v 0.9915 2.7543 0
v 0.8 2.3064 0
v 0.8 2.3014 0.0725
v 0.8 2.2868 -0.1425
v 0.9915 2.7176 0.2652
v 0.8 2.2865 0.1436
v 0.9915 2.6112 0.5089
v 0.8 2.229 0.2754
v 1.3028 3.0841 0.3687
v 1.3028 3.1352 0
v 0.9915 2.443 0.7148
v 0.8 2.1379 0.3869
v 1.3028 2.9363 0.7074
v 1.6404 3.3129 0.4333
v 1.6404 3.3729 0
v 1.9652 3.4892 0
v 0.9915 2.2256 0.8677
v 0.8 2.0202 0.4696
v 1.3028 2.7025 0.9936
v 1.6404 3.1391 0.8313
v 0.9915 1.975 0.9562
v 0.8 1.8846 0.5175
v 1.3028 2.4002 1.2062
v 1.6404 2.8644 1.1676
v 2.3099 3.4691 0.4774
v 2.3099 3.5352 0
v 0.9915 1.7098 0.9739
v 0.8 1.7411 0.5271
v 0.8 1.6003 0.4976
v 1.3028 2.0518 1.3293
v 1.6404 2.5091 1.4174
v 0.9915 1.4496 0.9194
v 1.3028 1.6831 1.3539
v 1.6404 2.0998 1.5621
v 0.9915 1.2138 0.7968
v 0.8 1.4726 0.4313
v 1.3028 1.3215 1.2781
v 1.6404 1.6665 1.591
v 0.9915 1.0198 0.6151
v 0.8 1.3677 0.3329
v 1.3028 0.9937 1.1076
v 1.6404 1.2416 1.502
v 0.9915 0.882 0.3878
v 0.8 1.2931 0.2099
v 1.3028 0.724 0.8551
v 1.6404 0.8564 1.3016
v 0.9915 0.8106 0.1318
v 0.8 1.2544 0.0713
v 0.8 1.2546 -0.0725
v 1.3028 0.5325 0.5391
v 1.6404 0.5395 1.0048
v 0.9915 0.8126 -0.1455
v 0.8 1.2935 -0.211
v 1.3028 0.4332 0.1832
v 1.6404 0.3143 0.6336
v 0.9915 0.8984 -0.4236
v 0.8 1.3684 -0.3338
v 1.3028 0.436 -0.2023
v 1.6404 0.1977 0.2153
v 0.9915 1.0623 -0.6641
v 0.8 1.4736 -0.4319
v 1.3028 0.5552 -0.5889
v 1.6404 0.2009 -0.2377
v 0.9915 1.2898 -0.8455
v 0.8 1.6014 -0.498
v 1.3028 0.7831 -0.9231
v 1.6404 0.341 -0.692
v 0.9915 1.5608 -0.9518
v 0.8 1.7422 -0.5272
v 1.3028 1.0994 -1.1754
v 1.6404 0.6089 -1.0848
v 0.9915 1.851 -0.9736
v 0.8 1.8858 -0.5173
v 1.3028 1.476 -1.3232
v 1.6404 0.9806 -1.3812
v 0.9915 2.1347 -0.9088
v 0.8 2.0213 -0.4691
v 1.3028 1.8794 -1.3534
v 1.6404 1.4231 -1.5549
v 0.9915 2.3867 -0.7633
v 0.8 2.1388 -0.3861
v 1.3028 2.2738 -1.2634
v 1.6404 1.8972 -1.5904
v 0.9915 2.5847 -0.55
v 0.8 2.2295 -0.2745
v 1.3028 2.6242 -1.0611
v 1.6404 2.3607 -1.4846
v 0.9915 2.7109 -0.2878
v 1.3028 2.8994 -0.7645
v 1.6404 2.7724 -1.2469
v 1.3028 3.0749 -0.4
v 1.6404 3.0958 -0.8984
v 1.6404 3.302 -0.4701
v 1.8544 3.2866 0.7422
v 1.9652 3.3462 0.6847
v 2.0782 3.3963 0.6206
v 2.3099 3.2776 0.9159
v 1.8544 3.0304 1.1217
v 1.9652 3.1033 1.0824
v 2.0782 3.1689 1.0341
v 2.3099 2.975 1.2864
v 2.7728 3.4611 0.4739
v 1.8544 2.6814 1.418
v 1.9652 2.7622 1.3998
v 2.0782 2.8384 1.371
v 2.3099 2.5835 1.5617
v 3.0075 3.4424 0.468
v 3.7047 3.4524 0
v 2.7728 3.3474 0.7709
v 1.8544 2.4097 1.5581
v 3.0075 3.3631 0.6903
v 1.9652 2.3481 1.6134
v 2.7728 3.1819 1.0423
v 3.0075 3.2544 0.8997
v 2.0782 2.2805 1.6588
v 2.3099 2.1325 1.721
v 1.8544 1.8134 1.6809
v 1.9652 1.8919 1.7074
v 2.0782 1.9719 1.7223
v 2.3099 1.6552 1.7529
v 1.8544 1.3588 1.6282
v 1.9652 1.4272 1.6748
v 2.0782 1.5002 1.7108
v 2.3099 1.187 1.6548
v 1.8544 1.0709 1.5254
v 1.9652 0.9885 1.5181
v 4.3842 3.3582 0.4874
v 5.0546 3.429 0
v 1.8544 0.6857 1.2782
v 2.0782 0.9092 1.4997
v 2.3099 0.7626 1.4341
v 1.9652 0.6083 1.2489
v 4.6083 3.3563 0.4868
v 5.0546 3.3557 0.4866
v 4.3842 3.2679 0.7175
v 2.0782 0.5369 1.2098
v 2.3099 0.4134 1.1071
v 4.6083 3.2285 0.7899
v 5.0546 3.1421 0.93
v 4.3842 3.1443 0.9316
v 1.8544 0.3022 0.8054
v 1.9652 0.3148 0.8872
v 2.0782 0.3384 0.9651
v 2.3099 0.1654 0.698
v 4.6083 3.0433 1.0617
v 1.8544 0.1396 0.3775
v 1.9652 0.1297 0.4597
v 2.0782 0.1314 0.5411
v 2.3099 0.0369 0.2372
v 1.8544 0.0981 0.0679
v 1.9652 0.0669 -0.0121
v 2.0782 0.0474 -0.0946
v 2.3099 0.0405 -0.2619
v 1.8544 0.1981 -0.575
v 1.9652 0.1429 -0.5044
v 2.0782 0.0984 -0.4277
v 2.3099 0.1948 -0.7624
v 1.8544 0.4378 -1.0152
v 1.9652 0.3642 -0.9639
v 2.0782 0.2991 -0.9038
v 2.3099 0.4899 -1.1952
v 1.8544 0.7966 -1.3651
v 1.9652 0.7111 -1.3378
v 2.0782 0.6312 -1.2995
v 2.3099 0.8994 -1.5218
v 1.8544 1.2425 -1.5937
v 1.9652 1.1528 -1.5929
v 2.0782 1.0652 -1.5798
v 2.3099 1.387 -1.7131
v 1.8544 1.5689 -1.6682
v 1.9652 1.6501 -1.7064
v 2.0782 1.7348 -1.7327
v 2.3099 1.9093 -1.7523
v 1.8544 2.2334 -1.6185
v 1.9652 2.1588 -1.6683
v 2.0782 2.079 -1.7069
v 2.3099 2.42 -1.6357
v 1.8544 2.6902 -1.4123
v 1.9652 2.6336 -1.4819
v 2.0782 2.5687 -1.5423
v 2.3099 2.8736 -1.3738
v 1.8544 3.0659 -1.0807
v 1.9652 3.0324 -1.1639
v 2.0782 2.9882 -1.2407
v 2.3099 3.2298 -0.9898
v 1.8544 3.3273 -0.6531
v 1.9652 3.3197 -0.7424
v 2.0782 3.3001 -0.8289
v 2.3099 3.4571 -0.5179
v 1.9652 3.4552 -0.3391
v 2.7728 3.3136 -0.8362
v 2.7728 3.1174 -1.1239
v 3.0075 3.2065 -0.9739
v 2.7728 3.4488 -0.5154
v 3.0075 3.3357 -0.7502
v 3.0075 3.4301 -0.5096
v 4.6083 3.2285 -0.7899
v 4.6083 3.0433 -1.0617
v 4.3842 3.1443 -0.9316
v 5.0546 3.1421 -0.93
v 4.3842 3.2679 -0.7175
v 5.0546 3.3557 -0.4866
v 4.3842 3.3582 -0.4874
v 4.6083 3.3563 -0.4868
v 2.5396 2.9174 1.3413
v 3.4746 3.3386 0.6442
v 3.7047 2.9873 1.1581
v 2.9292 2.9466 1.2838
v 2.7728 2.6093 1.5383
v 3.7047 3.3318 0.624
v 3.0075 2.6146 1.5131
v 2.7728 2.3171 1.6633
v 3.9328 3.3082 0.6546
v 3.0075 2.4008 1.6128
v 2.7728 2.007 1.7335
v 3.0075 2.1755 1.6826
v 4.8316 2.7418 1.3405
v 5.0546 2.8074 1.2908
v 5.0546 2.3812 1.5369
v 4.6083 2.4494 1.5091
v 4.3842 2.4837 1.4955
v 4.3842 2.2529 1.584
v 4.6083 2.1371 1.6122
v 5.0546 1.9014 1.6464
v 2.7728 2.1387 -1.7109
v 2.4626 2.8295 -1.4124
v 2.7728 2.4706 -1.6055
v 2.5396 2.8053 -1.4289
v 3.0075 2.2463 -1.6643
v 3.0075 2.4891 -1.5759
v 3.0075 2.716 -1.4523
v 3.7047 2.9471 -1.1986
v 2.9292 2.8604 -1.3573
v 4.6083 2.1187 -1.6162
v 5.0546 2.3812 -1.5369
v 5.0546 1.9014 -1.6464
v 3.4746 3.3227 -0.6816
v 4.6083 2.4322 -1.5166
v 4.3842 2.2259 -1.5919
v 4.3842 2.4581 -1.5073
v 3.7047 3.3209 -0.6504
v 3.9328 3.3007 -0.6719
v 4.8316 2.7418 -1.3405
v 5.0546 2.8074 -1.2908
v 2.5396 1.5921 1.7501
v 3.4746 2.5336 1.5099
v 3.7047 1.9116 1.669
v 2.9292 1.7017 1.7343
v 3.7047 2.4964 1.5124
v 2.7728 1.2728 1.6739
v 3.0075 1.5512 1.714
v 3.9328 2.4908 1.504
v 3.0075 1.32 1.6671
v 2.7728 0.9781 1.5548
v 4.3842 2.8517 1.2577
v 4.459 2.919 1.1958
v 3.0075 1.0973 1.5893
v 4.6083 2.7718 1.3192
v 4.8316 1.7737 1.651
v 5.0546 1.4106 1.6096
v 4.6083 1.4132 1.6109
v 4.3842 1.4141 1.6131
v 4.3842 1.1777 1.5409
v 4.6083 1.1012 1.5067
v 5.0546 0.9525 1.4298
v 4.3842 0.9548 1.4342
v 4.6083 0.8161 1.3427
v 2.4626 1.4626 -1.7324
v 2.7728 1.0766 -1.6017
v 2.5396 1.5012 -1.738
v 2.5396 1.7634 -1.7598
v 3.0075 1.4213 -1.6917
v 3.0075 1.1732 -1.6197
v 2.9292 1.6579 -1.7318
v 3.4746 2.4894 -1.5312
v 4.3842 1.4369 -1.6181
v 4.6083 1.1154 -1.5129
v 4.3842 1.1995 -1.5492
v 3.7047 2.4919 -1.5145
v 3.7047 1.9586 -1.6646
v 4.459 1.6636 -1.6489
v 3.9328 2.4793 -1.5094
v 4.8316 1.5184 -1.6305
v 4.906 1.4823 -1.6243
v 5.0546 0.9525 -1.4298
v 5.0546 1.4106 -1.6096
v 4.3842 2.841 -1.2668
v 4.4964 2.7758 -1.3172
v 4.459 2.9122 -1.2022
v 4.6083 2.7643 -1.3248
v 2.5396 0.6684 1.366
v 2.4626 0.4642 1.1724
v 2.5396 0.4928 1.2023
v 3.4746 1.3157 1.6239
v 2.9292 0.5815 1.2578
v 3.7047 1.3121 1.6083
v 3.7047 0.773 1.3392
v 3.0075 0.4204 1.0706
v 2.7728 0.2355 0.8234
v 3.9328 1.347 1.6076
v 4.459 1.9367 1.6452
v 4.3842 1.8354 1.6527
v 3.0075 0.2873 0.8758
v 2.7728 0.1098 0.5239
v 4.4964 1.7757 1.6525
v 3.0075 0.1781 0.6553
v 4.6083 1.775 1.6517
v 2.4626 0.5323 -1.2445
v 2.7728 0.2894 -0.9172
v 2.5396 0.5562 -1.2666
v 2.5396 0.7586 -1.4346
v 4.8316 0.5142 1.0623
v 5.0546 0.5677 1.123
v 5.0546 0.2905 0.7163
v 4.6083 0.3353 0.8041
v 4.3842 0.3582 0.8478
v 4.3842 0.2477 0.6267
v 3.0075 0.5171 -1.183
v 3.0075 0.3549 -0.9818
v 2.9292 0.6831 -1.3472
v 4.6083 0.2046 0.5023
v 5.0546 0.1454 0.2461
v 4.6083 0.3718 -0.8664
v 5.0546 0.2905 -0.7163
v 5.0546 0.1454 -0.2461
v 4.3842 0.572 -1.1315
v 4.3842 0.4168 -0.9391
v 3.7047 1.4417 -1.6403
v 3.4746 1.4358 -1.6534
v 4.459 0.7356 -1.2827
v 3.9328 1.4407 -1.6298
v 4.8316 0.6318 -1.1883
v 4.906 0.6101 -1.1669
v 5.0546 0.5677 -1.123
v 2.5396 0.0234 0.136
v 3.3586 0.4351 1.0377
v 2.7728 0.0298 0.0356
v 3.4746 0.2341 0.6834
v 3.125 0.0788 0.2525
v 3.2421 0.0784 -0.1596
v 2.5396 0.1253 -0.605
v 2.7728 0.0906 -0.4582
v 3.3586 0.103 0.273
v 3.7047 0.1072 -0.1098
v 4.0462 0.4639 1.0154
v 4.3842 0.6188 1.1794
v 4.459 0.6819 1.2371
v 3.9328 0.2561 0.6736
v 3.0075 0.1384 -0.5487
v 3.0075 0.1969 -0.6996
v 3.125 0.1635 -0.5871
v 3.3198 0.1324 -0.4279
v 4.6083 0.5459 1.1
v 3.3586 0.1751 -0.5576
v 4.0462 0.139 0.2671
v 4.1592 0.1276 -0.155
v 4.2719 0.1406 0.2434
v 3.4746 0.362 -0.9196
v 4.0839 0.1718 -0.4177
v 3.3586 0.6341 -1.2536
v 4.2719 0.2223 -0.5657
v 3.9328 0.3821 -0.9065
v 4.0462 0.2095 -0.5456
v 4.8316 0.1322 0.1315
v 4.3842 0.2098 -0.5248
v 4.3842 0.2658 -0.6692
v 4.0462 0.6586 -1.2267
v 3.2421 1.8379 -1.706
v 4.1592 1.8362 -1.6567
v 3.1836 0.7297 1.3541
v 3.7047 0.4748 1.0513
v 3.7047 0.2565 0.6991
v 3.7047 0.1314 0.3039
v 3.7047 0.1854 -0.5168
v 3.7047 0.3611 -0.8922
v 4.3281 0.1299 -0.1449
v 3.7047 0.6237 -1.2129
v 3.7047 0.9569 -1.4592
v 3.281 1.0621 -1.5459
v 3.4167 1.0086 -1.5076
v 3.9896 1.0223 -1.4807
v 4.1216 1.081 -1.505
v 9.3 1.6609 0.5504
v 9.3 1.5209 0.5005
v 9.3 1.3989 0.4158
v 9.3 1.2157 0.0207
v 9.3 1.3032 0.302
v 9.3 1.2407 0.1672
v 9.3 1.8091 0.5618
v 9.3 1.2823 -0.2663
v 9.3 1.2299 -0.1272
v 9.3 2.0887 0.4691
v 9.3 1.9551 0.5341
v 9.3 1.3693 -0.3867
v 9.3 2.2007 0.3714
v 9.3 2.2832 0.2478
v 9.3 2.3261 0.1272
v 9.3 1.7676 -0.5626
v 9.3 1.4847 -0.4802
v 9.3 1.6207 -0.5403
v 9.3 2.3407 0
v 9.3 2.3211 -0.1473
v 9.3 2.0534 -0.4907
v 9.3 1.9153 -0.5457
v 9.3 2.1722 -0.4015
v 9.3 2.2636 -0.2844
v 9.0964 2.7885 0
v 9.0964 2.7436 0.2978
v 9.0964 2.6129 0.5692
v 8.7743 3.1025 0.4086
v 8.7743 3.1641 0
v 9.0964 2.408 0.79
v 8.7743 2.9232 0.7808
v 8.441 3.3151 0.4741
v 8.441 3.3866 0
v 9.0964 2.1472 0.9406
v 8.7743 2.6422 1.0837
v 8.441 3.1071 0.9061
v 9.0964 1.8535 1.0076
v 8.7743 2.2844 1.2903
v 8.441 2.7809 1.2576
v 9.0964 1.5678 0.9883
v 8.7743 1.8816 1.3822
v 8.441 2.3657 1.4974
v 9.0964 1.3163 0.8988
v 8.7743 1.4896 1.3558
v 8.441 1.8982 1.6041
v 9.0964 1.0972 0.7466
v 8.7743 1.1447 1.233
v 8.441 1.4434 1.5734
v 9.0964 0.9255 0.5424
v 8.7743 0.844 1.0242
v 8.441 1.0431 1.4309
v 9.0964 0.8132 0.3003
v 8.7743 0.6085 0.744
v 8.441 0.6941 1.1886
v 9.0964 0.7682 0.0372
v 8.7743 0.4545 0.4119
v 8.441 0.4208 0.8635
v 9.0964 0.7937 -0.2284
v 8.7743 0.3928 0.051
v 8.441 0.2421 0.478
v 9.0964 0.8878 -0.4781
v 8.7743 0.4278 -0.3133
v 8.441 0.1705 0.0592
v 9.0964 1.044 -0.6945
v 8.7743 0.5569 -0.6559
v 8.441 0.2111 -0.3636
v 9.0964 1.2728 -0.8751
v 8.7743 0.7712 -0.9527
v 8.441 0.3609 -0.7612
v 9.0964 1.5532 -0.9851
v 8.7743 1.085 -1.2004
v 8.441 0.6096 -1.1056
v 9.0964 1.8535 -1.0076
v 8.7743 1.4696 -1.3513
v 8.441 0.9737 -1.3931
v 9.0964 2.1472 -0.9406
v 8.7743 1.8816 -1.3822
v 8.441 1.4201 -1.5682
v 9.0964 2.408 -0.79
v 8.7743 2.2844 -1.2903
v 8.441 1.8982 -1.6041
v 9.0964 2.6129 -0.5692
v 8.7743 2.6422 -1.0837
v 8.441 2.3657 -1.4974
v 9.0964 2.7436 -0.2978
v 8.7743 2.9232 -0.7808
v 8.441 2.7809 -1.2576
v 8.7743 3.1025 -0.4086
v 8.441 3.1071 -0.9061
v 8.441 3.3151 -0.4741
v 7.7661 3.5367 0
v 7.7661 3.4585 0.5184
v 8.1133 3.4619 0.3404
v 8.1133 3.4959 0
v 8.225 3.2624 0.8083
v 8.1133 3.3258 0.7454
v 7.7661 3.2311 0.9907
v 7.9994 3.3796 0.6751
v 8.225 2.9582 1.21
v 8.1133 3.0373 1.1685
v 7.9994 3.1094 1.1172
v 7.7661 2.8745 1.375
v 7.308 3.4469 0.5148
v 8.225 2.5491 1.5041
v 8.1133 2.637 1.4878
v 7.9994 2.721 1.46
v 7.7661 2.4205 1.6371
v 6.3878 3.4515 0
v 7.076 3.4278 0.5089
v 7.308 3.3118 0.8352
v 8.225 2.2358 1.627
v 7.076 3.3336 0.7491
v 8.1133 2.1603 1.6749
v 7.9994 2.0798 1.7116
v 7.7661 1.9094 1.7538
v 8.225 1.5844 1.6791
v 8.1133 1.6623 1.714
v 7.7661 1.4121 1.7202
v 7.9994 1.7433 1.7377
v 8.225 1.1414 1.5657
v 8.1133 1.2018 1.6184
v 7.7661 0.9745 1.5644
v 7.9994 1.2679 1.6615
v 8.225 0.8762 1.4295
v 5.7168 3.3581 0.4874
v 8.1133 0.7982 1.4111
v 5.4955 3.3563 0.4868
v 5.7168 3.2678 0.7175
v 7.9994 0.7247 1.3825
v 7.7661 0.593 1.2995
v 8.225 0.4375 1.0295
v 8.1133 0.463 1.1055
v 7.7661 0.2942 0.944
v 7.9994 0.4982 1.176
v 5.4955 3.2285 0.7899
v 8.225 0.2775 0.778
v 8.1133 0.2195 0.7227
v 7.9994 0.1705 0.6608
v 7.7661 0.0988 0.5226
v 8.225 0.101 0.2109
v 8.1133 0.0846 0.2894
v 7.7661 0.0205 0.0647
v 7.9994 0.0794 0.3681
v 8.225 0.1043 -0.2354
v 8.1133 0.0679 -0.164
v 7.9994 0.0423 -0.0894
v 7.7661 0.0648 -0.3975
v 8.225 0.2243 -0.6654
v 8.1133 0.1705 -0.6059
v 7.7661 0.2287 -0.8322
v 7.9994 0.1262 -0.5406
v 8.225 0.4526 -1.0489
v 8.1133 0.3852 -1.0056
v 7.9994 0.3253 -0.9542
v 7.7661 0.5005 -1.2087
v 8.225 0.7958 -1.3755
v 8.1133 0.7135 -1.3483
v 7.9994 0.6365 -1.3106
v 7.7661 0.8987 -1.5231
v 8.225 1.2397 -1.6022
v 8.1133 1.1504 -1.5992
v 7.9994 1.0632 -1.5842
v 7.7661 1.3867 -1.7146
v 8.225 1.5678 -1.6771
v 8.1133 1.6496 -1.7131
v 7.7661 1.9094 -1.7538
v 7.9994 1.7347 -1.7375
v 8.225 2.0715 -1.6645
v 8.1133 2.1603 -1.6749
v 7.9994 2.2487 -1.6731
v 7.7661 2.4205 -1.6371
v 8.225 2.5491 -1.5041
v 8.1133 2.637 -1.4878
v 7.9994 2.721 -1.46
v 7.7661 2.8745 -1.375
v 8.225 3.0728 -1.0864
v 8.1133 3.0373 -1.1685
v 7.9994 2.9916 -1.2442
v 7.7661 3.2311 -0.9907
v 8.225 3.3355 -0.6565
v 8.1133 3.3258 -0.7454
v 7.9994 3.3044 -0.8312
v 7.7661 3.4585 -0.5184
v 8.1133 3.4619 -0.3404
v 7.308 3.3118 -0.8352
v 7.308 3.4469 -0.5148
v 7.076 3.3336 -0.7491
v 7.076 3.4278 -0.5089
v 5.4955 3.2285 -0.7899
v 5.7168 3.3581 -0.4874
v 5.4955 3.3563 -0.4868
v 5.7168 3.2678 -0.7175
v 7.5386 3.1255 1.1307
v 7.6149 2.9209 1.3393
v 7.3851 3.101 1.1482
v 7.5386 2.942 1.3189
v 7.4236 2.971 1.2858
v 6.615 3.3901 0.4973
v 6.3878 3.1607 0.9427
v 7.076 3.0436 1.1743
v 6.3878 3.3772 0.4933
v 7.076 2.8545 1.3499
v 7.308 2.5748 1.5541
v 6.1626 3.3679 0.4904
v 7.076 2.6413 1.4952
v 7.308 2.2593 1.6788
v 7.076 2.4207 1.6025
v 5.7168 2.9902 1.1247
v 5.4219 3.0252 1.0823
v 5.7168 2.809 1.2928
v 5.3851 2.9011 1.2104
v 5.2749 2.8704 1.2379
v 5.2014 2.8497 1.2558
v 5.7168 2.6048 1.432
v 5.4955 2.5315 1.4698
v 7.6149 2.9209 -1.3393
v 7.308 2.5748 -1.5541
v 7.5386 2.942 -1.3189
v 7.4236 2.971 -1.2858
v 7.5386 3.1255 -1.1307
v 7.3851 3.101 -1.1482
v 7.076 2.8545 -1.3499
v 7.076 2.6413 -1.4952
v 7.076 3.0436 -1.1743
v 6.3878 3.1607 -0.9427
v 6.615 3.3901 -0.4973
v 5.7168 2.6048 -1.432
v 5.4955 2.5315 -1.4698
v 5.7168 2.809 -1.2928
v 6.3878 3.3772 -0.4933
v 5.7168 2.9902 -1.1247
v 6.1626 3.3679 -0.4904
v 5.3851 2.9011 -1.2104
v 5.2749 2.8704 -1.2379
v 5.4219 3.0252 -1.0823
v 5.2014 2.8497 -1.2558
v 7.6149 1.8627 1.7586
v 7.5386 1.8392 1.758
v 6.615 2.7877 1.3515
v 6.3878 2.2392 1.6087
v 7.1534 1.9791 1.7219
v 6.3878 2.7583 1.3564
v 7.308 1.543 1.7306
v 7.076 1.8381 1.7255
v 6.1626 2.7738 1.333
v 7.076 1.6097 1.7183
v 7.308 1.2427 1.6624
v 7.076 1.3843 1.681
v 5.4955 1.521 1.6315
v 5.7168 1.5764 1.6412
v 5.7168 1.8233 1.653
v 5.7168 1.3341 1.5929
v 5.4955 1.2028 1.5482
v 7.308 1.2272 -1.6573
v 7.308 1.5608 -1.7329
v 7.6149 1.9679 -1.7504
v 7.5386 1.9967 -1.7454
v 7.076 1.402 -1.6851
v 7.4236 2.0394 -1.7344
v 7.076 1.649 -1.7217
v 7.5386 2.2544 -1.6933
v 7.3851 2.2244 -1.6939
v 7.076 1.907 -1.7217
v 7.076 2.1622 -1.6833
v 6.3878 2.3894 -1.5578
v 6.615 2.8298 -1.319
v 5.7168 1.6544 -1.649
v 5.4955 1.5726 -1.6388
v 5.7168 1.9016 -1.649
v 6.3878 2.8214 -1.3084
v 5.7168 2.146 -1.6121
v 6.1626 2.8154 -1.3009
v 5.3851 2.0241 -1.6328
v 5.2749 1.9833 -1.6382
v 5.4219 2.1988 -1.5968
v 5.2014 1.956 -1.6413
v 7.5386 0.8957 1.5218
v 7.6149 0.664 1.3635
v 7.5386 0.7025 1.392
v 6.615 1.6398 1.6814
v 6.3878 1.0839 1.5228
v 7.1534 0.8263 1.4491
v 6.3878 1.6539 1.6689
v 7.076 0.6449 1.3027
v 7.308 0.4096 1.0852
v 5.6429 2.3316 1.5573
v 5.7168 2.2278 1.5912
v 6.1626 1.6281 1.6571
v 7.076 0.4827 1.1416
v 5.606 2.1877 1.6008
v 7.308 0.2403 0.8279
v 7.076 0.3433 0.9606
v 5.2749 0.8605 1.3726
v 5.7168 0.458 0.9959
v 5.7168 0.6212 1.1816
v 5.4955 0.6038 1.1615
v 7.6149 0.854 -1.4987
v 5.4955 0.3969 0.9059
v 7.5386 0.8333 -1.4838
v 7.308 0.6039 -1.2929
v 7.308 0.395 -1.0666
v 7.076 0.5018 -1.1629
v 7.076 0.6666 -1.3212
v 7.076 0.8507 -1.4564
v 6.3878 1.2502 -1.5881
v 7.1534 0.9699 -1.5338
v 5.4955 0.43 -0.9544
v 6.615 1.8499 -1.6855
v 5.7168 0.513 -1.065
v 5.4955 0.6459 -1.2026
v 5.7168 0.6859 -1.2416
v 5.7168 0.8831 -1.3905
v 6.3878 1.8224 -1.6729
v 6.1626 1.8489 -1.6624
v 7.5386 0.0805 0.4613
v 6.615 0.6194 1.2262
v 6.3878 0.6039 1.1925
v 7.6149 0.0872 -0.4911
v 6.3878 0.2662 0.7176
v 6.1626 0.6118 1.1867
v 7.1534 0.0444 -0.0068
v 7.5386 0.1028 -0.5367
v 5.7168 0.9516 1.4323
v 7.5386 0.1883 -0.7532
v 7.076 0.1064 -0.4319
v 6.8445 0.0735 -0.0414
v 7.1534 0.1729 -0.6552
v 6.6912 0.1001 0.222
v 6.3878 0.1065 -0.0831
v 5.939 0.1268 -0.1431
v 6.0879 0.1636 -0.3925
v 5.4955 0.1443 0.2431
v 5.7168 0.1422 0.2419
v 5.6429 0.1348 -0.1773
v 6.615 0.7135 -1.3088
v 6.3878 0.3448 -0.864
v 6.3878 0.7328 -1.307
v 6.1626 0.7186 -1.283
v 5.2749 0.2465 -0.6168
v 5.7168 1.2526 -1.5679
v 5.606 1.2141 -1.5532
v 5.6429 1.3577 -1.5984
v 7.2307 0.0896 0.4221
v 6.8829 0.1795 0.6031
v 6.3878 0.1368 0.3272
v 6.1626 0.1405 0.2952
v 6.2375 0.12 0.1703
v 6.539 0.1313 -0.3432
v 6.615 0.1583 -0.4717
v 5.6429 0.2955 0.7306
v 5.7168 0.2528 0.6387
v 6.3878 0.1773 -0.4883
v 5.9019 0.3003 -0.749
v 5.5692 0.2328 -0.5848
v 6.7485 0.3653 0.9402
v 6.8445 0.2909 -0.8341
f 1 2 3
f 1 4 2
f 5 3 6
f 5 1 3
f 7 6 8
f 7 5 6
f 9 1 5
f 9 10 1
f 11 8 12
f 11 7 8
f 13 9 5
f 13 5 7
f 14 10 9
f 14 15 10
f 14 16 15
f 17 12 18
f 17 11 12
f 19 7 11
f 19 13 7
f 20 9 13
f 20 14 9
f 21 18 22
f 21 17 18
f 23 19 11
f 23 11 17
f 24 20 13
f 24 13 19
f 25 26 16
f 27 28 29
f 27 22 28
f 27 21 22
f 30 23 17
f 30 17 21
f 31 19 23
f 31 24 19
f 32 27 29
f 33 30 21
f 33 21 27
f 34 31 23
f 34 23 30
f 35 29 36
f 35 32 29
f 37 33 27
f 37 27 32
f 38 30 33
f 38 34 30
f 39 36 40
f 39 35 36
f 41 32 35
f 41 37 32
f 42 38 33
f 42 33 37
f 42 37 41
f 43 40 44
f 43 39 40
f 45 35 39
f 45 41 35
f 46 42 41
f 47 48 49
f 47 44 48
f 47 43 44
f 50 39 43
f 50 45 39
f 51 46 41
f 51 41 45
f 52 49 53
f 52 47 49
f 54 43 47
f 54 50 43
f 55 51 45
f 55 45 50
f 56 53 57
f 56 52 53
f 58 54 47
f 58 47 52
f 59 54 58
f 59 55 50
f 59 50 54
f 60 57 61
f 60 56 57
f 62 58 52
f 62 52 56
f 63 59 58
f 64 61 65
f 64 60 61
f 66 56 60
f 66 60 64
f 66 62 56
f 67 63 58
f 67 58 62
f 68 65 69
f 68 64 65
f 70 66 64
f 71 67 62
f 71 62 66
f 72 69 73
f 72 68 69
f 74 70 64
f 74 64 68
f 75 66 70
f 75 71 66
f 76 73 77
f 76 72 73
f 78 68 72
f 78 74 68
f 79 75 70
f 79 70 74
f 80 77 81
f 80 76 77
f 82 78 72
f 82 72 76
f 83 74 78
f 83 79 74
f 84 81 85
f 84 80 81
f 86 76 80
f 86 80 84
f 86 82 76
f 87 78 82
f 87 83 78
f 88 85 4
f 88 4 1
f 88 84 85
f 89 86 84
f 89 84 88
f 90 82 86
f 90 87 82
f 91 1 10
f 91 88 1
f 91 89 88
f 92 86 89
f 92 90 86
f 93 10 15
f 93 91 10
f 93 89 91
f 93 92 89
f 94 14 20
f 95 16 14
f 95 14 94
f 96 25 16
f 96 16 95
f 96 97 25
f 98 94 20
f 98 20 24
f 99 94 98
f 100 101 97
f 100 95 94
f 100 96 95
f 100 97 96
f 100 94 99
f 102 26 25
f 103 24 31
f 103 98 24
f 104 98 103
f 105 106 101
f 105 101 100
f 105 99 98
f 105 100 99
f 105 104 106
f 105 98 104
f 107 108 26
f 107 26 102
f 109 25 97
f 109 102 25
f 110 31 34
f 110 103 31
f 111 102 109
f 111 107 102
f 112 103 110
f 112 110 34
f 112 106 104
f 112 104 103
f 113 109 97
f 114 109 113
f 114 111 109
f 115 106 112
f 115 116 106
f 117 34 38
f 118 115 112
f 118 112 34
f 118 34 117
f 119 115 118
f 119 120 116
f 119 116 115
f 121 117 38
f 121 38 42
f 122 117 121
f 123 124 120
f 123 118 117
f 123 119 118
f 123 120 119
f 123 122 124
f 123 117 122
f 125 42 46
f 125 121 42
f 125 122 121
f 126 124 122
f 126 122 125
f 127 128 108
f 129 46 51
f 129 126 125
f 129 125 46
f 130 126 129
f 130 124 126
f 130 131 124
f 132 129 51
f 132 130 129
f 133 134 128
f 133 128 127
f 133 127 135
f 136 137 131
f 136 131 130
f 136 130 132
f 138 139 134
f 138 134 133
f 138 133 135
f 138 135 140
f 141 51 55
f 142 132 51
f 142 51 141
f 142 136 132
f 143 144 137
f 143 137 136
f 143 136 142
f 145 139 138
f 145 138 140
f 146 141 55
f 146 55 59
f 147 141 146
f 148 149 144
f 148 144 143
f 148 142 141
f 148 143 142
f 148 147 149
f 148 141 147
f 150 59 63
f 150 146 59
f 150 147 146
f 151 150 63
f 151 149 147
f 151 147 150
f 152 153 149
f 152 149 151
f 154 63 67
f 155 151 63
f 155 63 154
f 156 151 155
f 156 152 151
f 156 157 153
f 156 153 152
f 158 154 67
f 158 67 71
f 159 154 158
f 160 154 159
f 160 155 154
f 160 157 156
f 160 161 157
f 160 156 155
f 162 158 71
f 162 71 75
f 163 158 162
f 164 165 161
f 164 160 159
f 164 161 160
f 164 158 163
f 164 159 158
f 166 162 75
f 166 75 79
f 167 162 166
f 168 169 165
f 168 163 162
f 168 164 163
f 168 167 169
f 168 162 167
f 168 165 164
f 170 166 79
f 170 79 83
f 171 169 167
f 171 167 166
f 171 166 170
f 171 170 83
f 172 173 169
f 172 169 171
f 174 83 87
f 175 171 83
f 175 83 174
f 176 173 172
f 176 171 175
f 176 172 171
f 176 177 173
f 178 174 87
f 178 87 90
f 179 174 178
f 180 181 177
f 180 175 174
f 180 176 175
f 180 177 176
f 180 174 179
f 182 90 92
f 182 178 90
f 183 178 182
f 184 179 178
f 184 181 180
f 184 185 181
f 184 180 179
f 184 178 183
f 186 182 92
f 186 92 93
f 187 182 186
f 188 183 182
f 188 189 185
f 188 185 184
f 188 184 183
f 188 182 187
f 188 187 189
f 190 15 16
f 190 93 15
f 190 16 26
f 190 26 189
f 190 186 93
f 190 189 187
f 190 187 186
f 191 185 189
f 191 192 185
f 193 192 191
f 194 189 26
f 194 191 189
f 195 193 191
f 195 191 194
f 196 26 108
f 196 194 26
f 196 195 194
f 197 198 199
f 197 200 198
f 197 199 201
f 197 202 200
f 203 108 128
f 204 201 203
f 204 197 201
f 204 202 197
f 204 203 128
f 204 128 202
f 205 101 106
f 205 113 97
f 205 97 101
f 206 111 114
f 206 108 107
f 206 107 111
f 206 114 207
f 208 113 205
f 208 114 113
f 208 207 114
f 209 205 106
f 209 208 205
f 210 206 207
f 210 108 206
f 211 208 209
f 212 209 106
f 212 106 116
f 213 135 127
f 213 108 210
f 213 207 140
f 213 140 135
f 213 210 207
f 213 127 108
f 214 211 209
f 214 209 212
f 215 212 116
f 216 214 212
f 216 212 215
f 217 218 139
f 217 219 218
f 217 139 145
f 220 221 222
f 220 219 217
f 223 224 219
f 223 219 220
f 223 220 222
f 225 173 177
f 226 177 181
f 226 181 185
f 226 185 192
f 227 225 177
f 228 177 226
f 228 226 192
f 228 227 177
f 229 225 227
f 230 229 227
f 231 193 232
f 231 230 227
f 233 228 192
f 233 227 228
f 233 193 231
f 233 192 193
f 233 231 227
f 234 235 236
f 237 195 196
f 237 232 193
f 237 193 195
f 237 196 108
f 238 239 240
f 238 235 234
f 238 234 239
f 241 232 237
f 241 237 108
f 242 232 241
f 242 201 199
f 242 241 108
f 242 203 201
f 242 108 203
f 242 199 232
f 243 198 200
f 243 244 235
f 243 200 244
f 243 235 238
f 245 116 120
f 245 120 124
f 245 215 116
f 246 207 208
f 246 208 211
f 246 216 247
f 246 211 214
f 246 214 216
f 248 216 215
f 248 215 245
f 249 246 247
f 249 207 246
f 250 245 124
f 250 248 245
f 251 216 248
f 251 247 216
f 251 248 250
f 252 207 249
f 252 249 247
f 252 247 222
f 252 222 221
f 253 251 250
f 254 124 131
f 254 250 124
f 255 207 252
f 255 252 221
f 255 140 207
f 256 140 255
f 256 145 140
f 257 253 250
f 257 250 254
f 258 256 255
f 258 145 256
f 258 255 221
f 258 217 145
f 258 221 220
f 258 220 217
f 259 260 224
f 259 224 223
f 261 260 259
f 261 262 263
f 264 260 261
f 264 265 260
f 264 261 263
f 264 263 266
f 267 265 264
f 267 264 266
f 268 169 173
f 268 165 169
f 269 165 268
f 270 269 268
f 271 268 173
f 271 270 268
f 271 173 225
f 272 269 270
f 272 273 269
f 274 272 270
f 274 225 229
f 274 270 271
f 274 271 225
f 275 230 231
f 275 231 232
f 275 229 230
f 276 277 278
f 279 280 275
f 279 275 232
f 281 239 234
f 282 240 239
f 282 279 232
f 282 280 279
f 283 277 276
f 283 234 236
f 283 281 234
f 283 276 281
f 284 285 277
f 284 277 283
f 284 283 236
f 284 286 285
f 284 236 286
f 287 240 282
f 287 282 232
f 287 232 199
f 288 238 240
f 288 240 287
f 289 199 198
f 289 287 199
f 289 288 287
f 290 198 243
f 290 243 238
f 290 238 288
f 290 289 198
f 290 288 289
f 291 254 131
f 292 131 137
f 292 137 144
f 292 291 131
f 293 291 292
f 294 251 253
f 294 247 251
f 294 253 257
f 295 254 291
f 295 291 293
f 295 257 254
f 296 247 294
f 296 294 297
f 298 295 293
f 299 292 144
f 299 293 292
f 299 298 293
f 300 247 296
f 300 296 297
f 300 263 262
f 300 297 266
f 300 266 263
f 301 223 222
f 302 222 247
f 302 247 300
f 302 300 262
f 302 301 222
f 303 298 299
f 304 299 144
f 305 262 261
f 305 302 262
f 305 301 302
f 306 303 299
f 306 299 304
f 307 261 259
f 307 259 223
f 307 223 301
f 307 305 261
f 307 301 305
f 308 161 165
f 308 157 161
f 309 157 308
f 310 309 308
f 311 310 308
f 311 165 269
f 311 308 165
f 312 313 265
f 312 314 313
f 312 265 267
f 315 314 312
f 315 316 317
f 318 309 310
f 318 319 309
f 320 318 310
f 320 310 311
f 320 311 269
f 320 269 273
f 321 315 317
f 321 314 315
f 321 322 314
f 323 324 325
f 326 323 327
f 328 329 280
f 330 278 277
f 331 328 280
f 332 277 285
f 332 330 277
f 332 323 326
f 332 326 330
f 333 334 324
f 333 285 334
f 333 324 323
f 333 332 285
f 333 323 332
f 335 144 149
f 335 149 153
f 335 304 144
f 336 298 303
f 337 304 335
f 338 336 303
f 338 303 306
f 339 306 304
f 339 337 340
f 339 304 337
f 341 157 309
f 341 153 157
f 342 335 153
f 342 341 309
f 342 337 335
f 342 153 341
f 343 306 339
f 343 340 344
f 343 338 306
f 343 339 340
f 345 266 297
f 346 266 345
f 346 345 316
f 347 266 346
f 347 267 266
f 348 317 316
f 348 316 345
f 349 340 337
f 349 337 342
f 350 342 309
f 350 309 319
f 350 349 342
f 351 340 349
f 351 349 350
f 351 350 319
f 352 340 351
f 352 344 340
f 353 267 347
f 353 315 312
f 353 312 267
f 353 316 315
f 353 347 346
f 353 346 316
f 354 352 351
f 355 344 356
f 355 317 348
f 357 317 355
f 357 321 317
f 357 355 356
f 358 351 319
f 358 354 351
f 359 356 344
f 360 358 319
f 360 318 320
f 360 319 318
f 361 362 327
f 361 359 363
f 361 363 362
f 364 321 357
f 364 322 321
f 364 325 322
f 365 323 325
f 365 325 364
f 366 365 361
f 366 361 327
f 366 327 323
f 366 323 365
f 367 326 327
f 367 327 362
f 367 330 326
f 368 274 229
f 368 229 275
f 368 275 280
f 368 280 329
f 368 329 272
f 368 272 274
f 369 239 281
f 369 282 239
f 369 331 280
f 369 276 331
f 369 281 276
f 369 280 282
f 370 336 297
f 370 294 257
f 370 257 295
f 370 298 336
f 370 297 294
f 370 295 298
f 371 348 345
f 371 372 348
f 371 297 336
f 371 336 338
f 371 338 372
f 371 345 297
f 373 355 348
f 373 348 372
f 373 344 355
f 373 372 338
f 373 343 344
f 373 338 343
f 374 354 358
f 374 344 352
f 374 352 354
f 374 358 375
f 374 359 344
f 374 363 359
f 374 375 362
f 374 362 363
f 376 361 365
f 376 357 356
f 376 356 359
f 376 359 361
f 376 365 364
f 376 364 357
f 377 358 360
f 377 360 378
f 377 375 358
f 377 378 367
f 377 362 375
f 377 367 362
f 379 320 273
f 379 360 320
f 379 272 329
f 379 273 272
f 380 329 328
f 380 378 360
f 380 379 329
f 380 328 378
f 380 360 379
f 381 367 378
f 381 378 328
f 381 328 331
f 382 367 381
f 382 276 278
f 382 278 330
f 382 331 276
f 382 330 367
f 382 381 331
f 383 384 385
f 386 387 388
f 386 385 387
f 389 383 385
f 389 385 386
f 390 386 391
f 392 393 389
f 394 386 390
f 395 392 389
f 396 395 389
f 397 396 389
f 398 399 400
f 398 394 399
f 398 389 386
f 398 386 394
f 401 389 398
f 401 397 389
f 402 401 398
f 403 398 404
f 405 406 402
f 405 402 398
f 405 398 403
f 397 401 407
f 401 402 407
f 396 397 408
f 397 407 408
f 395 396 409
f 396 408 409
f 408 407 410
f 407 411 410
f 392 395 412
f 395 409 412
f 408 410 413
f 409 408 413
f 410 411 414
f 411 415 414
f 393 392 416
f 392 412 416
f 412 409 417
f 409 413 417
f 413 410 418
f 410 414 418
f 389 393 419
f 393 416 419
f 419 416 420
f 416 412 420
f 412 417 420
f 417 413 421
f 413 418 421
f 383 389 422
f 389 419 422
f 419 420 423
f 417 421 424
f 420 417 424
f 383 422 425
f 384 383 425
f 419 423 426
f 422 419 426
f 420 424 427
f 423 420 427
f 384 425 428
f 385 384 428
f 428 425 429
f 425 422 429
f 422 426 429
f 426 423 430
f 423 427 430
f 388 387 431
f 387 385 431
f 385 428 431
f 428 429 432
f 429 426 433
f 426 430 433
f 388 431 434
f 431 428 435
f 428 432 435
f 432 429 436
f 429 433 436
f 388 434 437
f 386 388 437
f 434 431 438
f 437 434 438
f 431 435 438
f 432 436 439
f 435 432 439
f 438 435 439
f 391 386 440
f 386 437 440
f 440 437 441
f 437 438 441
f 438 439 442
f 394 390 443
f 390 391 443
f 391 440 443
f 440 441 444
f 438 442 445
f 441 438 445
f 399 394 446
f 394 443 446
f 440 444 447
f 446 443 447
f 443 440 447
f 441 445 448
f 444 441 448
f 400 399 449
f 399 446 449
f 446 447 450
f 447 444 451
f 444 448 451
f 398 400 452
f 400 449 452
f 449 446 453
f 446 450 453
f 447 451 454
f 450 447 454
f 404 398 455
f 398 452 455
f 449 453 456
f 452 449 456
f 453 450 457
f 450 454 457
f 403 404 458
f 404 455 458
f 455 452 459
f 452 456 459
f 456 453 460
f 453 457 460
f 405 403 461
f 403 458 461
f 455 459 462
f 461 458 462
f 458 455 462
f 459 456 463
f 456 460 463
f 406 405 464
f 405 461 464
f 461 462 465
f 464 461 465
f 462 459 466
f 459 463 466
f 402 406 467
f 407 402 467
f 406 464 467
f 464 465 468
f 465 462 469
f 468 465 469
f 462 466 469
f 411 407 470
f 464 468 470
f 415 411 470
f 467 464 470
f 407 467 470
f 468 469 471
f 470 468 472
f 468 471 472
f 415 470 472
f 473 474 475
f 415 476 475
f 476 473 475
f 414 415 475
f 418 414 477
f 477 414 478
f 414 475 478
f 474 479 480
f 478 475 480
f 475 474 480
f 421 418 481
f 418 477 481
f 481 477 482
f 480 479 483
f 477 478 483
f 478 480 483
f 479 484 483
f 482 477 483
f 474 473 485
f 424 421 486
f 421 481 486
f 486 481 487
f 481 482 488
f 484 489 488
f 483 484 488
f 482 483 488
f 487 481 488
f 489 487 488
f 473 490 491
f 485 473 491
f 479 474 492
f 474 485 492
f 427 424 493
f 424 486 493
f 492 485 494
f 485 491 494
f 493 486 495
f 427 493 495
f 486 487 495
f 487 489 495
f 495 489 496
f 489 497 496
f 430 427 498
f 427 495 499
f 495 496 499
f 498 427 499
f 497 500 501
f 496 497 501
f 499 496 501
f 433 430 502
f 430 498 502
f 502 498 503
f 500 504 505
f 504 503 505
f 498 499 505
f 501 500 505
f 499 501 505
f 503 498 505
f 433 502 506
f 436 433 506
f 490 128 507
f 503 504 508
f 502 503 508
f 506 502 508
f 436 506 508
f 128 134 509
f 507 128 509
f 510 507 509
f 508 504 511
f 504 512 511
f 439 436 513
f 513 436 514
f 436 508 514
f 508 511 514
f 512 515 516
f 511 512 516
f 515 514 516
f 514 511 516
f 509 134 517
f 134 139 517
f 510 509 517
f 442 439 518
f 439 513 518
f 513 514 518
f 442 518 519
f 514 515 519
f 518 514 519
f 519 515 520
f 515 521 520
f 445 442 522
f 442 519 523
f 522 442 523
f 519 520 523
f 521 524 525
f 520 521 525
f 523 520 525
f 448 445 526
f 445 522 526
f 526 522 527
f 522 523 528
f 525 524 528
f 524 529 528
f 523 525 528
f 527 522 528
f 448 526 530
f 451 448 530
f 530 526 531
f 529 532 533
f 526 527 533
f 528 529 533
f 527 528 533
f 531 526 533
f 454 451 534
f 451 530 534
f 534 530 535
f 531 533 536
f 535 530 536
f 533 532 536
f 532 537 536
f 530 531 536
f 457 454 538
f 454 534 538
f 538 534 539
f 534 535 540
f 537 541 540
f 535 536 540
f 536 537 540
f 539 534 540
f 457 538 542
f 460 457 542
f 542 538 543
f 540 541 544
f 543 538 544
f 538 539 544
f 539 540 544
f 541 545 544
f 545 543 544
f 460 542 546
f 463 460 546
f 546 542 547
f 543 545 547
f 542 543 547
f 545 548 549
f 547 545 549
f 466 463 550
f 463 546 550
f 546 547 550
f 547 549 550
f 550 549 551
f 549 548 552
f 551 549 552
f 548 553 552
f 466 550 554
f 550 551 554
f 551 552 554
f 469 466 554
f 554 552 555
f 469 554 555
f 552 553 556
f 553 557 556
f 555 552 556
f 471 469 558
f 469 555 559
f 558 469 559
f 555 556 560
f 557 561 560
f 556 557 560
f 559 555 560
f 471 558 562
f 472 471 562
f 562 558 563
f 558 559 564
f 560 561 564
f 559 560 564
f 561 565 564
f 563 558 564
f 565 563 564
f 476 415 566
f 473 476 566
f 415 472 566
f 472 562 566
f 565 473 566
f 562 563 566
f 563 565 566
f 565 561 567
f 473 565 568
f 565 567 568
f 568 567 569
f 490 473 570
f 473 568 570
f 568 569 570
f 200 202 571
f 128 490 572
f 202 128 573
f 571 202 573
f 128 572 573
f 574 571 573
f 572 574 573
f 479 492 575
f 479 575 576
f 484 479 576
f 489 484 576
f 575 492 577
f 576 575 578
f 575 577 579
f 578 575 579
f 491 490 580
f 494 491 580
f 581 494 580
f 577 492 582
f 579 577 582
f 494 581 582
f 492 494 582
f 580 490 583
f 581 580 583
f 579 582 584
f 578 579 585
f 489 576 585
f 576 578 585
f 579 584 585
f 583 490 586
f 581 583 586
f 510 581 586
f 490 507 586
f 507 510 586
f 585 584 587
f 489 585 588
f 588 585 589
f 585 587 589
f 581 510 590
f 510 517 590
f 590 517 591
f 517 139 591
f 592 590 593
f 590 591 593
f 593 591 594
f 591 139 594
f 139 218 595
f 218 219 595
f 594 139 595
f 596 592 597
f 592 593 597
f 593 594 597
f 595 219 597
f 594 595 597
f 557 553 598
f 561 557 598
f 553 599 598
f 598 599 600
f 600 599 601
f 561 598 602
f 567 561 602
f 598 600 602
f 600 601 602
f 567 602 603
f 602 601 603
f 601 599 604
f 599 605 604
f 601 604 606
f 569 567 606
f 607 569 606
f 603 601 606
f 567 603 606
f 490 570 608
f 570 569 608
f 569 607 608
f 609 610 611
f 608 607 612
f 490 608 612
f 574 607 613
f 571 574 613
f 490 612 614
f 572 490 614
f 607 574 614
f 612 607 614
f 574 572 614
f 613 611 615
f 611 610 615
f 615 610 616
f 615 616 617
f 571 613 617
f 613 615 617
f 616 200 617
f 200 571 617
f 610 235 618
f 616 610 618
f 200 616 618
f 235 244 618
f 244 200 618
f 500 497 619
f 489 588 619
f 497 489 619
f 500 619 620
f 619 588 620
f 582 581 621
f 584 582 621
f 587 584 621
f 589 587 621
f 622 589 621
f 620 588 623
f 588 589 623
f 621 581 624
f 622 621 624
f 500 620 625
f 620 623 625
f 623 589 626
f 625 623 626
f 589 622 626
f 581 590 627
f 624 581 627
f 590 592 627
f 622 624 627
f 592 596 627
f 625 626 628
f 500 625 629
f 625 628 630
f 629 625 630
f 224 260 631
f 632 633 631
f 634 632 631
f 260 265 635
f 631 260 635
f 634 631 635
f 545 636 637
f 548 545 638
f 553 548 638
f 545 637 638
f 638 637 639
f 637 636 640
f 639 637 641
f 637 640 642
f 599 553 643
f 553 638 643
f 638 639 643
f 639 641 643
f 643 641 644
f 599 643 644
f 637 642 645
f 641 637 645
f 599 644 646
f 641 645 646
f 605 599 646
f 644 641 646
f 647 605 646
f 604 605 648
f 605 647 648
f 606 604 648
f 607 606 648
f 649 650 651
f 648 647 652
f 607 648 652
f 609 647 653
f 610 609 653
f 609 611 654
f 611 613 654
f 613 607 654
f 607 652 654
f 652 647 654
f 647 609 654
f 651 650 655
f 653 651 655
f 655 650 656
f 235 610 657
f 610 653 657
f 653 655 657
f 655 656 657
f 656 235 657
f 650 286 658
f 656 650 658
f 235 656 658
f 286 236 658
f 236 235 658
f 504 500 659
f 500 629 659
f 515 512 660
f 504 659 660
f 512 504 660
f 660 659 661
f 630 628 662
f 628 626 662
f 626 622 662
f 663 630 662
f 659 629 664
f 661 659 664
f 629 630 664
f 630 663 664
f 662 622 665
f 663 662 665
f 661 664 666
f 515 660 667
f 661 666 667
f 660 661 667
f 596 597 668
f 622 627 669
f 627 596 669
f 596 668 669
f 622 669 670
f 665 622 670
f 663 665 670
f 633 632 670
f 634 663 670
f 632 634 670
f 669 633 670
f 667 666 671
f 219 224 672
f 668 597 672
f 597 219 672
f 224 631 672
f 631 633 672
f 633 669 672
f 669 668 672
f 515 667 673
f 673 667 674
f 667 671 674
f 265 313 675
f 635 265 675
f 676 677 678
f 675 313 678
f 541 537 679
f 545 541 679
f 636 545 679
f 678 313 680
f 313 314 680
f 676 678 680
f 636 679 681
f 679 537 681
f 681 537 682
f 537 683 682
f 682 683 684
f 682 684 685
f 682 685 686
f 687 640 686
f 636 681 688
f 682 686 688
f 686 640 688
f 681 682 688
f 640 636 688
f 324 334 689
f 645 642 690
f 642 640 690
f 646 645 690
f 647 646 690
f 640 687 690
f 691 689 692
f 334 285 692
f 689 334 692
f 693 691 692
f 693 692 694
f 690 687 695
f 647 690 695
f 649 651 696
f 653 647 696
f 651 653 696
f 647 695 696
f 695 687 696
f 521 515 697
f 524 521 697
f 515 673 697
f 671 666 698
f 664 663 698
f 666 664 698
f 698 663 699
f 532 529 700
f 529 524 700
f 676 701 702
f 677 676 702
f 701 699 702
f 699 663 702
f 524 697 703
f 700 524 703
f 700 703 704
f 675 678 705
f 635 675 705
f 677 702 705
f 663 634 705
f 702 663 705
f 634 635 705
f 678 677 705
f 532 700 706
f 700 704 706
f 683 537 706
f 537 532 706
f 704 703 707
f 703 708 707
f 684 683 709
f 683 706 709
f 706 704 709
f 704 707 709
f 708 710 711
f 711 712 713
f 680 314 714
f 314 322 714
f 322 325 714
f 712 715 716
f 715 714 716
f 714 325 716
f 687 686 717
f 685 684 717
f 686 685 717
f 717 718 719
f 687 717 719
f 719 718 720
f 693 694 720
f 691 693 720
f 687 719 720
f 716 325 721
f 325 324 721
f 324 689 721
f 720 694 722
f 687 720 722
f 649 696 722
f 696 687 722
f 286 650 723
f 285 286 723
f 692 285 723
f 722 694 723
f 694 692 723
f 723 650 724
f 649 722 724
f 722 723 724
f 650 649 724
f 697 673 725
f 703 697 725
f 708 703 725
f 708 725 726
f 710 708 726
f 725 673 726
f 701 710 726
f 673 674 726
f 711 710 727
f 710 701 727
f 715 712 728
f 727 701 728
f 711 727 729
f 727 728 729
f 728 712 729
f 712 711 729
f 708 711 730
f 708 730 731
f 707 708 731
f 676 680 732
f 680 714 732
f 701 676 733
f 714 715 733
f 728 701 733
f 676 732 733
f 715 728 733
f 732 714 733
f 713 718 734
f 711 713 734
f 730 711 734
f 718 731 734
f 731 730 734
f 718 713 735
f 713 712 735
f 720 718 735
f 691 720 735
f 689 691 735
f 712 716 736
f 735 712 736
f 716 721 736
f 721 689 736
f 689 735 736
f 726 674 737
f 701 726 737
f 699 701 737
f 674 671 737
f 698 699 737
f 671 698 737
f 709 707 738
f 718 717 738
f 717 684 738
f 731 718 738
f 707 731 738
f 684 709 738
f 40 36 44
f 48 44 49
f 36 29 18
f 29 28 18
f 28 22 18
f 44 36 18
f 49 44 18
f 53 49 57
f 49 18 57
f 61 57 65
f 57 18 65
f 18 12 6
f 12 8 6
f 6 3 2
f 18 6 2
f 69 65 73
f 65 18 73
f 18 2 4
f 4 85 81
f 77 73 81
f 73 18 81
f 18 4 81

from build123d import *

# Parameters (mm, degrees)
SKETCH3_R          = 0.30479999999999996
SKETCH8_R          = 6.164171136290504
CUT_EXTRUDE1_DEPTH = 11.394859843298219
CUT_EXTRUDE2_START = 8.5
SKETCH8_2_R        = 6.164171136290504
CUT_EXTRUDE2_DEPTH = 2.894859843298219


with BuildPart() as part:
    # Base-Sweep: sweep along a path in Sketch1
    with BuildLine(Plane.XY) as base_sweep_path:
        Line((0, -2.54), (0, 1.016))
        ThreePointArc((0, 1.016), (0.22318463273585087, 1.5548153672641494), (0.762, 1.778))
    # Sketch3 → Base-Sweep (sweep)
    with BuildSketch(Plane(origin=(0, -2.54, 0), x_dir=(-1, 0, 0), z_dir=(0, 1, 0))):
        Circle(SKETCH3_R)
    sweep(path=base_sweep_path.line)

    # Sketch4 → Boss-Revolve1 (revolve)
    with BuildSketch(Plane.XY):
        with BuildLine():
            Line((5.054600000000001, 3.4290000000000003), (5.054600000000001, 1.778))
            Line((5.054600000000001, 1.778), (0.7619999999999998, 1.7779999999999996))
            add(Edge.make_bspline(
                [(0.7619999999999998, 1.7779999999999996), (0.7577984811626078, 1.8794424331425004), (0.7319399994614139, 2.503775538065161), (1.5817178580203402, 3.712321469151558), (3.3608825764965076, 3.428182395478029), (4.479173993062019, 3.428722225857275), (5.054600000000001, 3.4290000000000003)],
                knots=[0, 0, 0, 0, 0.05769047479405517, 0.3550592403677721, 0.668140450217807, 1, 1, 1, 1], degree=3))
        make_face()
    revolve(axis=Axis((0.7619999999999998, 1.7779999999999996, 0), (1, 1e-16, 0)))

    # Boss-Mirror1: part across plane


with BuildPart() as part_1:
    add(part.part)
    add(part.part.mirror(Plane(origin=(5.054600000000001, 3.4290000000000003, 0), x_dir=(0, 0, 1), z_dir=(1, 1e-16, 0))))

    # Sketch8 → Cut-Extrude1 (cut, through all)
    with BuildSketch(Plane(origin=(0.8, 0, 0), x_dir=(0, 0, -1), z_dir=(1, 0, 0))):
        Circle(SKETCH8_R)
    extrude(amount=-CUT_EXTRUDE1_DEPTH, mode=Mode.SUBTRACT)

    # Sketch8<2> → Cut-Extrude2 (cut, through all)
    with BuildSketch(Plane(origin=(0.8, 0, 0), x_dir=(0, 0, -1), z_dir=(1, 0, 0)).offset(CUT_EXTRUDE2_START)):
        Circle(SKETCH8_2_R)
    extrude(amount=CUT_EXTRUDE2_DEPTH, mode=Mode.SUBTRACT)


solid = part_1.part
